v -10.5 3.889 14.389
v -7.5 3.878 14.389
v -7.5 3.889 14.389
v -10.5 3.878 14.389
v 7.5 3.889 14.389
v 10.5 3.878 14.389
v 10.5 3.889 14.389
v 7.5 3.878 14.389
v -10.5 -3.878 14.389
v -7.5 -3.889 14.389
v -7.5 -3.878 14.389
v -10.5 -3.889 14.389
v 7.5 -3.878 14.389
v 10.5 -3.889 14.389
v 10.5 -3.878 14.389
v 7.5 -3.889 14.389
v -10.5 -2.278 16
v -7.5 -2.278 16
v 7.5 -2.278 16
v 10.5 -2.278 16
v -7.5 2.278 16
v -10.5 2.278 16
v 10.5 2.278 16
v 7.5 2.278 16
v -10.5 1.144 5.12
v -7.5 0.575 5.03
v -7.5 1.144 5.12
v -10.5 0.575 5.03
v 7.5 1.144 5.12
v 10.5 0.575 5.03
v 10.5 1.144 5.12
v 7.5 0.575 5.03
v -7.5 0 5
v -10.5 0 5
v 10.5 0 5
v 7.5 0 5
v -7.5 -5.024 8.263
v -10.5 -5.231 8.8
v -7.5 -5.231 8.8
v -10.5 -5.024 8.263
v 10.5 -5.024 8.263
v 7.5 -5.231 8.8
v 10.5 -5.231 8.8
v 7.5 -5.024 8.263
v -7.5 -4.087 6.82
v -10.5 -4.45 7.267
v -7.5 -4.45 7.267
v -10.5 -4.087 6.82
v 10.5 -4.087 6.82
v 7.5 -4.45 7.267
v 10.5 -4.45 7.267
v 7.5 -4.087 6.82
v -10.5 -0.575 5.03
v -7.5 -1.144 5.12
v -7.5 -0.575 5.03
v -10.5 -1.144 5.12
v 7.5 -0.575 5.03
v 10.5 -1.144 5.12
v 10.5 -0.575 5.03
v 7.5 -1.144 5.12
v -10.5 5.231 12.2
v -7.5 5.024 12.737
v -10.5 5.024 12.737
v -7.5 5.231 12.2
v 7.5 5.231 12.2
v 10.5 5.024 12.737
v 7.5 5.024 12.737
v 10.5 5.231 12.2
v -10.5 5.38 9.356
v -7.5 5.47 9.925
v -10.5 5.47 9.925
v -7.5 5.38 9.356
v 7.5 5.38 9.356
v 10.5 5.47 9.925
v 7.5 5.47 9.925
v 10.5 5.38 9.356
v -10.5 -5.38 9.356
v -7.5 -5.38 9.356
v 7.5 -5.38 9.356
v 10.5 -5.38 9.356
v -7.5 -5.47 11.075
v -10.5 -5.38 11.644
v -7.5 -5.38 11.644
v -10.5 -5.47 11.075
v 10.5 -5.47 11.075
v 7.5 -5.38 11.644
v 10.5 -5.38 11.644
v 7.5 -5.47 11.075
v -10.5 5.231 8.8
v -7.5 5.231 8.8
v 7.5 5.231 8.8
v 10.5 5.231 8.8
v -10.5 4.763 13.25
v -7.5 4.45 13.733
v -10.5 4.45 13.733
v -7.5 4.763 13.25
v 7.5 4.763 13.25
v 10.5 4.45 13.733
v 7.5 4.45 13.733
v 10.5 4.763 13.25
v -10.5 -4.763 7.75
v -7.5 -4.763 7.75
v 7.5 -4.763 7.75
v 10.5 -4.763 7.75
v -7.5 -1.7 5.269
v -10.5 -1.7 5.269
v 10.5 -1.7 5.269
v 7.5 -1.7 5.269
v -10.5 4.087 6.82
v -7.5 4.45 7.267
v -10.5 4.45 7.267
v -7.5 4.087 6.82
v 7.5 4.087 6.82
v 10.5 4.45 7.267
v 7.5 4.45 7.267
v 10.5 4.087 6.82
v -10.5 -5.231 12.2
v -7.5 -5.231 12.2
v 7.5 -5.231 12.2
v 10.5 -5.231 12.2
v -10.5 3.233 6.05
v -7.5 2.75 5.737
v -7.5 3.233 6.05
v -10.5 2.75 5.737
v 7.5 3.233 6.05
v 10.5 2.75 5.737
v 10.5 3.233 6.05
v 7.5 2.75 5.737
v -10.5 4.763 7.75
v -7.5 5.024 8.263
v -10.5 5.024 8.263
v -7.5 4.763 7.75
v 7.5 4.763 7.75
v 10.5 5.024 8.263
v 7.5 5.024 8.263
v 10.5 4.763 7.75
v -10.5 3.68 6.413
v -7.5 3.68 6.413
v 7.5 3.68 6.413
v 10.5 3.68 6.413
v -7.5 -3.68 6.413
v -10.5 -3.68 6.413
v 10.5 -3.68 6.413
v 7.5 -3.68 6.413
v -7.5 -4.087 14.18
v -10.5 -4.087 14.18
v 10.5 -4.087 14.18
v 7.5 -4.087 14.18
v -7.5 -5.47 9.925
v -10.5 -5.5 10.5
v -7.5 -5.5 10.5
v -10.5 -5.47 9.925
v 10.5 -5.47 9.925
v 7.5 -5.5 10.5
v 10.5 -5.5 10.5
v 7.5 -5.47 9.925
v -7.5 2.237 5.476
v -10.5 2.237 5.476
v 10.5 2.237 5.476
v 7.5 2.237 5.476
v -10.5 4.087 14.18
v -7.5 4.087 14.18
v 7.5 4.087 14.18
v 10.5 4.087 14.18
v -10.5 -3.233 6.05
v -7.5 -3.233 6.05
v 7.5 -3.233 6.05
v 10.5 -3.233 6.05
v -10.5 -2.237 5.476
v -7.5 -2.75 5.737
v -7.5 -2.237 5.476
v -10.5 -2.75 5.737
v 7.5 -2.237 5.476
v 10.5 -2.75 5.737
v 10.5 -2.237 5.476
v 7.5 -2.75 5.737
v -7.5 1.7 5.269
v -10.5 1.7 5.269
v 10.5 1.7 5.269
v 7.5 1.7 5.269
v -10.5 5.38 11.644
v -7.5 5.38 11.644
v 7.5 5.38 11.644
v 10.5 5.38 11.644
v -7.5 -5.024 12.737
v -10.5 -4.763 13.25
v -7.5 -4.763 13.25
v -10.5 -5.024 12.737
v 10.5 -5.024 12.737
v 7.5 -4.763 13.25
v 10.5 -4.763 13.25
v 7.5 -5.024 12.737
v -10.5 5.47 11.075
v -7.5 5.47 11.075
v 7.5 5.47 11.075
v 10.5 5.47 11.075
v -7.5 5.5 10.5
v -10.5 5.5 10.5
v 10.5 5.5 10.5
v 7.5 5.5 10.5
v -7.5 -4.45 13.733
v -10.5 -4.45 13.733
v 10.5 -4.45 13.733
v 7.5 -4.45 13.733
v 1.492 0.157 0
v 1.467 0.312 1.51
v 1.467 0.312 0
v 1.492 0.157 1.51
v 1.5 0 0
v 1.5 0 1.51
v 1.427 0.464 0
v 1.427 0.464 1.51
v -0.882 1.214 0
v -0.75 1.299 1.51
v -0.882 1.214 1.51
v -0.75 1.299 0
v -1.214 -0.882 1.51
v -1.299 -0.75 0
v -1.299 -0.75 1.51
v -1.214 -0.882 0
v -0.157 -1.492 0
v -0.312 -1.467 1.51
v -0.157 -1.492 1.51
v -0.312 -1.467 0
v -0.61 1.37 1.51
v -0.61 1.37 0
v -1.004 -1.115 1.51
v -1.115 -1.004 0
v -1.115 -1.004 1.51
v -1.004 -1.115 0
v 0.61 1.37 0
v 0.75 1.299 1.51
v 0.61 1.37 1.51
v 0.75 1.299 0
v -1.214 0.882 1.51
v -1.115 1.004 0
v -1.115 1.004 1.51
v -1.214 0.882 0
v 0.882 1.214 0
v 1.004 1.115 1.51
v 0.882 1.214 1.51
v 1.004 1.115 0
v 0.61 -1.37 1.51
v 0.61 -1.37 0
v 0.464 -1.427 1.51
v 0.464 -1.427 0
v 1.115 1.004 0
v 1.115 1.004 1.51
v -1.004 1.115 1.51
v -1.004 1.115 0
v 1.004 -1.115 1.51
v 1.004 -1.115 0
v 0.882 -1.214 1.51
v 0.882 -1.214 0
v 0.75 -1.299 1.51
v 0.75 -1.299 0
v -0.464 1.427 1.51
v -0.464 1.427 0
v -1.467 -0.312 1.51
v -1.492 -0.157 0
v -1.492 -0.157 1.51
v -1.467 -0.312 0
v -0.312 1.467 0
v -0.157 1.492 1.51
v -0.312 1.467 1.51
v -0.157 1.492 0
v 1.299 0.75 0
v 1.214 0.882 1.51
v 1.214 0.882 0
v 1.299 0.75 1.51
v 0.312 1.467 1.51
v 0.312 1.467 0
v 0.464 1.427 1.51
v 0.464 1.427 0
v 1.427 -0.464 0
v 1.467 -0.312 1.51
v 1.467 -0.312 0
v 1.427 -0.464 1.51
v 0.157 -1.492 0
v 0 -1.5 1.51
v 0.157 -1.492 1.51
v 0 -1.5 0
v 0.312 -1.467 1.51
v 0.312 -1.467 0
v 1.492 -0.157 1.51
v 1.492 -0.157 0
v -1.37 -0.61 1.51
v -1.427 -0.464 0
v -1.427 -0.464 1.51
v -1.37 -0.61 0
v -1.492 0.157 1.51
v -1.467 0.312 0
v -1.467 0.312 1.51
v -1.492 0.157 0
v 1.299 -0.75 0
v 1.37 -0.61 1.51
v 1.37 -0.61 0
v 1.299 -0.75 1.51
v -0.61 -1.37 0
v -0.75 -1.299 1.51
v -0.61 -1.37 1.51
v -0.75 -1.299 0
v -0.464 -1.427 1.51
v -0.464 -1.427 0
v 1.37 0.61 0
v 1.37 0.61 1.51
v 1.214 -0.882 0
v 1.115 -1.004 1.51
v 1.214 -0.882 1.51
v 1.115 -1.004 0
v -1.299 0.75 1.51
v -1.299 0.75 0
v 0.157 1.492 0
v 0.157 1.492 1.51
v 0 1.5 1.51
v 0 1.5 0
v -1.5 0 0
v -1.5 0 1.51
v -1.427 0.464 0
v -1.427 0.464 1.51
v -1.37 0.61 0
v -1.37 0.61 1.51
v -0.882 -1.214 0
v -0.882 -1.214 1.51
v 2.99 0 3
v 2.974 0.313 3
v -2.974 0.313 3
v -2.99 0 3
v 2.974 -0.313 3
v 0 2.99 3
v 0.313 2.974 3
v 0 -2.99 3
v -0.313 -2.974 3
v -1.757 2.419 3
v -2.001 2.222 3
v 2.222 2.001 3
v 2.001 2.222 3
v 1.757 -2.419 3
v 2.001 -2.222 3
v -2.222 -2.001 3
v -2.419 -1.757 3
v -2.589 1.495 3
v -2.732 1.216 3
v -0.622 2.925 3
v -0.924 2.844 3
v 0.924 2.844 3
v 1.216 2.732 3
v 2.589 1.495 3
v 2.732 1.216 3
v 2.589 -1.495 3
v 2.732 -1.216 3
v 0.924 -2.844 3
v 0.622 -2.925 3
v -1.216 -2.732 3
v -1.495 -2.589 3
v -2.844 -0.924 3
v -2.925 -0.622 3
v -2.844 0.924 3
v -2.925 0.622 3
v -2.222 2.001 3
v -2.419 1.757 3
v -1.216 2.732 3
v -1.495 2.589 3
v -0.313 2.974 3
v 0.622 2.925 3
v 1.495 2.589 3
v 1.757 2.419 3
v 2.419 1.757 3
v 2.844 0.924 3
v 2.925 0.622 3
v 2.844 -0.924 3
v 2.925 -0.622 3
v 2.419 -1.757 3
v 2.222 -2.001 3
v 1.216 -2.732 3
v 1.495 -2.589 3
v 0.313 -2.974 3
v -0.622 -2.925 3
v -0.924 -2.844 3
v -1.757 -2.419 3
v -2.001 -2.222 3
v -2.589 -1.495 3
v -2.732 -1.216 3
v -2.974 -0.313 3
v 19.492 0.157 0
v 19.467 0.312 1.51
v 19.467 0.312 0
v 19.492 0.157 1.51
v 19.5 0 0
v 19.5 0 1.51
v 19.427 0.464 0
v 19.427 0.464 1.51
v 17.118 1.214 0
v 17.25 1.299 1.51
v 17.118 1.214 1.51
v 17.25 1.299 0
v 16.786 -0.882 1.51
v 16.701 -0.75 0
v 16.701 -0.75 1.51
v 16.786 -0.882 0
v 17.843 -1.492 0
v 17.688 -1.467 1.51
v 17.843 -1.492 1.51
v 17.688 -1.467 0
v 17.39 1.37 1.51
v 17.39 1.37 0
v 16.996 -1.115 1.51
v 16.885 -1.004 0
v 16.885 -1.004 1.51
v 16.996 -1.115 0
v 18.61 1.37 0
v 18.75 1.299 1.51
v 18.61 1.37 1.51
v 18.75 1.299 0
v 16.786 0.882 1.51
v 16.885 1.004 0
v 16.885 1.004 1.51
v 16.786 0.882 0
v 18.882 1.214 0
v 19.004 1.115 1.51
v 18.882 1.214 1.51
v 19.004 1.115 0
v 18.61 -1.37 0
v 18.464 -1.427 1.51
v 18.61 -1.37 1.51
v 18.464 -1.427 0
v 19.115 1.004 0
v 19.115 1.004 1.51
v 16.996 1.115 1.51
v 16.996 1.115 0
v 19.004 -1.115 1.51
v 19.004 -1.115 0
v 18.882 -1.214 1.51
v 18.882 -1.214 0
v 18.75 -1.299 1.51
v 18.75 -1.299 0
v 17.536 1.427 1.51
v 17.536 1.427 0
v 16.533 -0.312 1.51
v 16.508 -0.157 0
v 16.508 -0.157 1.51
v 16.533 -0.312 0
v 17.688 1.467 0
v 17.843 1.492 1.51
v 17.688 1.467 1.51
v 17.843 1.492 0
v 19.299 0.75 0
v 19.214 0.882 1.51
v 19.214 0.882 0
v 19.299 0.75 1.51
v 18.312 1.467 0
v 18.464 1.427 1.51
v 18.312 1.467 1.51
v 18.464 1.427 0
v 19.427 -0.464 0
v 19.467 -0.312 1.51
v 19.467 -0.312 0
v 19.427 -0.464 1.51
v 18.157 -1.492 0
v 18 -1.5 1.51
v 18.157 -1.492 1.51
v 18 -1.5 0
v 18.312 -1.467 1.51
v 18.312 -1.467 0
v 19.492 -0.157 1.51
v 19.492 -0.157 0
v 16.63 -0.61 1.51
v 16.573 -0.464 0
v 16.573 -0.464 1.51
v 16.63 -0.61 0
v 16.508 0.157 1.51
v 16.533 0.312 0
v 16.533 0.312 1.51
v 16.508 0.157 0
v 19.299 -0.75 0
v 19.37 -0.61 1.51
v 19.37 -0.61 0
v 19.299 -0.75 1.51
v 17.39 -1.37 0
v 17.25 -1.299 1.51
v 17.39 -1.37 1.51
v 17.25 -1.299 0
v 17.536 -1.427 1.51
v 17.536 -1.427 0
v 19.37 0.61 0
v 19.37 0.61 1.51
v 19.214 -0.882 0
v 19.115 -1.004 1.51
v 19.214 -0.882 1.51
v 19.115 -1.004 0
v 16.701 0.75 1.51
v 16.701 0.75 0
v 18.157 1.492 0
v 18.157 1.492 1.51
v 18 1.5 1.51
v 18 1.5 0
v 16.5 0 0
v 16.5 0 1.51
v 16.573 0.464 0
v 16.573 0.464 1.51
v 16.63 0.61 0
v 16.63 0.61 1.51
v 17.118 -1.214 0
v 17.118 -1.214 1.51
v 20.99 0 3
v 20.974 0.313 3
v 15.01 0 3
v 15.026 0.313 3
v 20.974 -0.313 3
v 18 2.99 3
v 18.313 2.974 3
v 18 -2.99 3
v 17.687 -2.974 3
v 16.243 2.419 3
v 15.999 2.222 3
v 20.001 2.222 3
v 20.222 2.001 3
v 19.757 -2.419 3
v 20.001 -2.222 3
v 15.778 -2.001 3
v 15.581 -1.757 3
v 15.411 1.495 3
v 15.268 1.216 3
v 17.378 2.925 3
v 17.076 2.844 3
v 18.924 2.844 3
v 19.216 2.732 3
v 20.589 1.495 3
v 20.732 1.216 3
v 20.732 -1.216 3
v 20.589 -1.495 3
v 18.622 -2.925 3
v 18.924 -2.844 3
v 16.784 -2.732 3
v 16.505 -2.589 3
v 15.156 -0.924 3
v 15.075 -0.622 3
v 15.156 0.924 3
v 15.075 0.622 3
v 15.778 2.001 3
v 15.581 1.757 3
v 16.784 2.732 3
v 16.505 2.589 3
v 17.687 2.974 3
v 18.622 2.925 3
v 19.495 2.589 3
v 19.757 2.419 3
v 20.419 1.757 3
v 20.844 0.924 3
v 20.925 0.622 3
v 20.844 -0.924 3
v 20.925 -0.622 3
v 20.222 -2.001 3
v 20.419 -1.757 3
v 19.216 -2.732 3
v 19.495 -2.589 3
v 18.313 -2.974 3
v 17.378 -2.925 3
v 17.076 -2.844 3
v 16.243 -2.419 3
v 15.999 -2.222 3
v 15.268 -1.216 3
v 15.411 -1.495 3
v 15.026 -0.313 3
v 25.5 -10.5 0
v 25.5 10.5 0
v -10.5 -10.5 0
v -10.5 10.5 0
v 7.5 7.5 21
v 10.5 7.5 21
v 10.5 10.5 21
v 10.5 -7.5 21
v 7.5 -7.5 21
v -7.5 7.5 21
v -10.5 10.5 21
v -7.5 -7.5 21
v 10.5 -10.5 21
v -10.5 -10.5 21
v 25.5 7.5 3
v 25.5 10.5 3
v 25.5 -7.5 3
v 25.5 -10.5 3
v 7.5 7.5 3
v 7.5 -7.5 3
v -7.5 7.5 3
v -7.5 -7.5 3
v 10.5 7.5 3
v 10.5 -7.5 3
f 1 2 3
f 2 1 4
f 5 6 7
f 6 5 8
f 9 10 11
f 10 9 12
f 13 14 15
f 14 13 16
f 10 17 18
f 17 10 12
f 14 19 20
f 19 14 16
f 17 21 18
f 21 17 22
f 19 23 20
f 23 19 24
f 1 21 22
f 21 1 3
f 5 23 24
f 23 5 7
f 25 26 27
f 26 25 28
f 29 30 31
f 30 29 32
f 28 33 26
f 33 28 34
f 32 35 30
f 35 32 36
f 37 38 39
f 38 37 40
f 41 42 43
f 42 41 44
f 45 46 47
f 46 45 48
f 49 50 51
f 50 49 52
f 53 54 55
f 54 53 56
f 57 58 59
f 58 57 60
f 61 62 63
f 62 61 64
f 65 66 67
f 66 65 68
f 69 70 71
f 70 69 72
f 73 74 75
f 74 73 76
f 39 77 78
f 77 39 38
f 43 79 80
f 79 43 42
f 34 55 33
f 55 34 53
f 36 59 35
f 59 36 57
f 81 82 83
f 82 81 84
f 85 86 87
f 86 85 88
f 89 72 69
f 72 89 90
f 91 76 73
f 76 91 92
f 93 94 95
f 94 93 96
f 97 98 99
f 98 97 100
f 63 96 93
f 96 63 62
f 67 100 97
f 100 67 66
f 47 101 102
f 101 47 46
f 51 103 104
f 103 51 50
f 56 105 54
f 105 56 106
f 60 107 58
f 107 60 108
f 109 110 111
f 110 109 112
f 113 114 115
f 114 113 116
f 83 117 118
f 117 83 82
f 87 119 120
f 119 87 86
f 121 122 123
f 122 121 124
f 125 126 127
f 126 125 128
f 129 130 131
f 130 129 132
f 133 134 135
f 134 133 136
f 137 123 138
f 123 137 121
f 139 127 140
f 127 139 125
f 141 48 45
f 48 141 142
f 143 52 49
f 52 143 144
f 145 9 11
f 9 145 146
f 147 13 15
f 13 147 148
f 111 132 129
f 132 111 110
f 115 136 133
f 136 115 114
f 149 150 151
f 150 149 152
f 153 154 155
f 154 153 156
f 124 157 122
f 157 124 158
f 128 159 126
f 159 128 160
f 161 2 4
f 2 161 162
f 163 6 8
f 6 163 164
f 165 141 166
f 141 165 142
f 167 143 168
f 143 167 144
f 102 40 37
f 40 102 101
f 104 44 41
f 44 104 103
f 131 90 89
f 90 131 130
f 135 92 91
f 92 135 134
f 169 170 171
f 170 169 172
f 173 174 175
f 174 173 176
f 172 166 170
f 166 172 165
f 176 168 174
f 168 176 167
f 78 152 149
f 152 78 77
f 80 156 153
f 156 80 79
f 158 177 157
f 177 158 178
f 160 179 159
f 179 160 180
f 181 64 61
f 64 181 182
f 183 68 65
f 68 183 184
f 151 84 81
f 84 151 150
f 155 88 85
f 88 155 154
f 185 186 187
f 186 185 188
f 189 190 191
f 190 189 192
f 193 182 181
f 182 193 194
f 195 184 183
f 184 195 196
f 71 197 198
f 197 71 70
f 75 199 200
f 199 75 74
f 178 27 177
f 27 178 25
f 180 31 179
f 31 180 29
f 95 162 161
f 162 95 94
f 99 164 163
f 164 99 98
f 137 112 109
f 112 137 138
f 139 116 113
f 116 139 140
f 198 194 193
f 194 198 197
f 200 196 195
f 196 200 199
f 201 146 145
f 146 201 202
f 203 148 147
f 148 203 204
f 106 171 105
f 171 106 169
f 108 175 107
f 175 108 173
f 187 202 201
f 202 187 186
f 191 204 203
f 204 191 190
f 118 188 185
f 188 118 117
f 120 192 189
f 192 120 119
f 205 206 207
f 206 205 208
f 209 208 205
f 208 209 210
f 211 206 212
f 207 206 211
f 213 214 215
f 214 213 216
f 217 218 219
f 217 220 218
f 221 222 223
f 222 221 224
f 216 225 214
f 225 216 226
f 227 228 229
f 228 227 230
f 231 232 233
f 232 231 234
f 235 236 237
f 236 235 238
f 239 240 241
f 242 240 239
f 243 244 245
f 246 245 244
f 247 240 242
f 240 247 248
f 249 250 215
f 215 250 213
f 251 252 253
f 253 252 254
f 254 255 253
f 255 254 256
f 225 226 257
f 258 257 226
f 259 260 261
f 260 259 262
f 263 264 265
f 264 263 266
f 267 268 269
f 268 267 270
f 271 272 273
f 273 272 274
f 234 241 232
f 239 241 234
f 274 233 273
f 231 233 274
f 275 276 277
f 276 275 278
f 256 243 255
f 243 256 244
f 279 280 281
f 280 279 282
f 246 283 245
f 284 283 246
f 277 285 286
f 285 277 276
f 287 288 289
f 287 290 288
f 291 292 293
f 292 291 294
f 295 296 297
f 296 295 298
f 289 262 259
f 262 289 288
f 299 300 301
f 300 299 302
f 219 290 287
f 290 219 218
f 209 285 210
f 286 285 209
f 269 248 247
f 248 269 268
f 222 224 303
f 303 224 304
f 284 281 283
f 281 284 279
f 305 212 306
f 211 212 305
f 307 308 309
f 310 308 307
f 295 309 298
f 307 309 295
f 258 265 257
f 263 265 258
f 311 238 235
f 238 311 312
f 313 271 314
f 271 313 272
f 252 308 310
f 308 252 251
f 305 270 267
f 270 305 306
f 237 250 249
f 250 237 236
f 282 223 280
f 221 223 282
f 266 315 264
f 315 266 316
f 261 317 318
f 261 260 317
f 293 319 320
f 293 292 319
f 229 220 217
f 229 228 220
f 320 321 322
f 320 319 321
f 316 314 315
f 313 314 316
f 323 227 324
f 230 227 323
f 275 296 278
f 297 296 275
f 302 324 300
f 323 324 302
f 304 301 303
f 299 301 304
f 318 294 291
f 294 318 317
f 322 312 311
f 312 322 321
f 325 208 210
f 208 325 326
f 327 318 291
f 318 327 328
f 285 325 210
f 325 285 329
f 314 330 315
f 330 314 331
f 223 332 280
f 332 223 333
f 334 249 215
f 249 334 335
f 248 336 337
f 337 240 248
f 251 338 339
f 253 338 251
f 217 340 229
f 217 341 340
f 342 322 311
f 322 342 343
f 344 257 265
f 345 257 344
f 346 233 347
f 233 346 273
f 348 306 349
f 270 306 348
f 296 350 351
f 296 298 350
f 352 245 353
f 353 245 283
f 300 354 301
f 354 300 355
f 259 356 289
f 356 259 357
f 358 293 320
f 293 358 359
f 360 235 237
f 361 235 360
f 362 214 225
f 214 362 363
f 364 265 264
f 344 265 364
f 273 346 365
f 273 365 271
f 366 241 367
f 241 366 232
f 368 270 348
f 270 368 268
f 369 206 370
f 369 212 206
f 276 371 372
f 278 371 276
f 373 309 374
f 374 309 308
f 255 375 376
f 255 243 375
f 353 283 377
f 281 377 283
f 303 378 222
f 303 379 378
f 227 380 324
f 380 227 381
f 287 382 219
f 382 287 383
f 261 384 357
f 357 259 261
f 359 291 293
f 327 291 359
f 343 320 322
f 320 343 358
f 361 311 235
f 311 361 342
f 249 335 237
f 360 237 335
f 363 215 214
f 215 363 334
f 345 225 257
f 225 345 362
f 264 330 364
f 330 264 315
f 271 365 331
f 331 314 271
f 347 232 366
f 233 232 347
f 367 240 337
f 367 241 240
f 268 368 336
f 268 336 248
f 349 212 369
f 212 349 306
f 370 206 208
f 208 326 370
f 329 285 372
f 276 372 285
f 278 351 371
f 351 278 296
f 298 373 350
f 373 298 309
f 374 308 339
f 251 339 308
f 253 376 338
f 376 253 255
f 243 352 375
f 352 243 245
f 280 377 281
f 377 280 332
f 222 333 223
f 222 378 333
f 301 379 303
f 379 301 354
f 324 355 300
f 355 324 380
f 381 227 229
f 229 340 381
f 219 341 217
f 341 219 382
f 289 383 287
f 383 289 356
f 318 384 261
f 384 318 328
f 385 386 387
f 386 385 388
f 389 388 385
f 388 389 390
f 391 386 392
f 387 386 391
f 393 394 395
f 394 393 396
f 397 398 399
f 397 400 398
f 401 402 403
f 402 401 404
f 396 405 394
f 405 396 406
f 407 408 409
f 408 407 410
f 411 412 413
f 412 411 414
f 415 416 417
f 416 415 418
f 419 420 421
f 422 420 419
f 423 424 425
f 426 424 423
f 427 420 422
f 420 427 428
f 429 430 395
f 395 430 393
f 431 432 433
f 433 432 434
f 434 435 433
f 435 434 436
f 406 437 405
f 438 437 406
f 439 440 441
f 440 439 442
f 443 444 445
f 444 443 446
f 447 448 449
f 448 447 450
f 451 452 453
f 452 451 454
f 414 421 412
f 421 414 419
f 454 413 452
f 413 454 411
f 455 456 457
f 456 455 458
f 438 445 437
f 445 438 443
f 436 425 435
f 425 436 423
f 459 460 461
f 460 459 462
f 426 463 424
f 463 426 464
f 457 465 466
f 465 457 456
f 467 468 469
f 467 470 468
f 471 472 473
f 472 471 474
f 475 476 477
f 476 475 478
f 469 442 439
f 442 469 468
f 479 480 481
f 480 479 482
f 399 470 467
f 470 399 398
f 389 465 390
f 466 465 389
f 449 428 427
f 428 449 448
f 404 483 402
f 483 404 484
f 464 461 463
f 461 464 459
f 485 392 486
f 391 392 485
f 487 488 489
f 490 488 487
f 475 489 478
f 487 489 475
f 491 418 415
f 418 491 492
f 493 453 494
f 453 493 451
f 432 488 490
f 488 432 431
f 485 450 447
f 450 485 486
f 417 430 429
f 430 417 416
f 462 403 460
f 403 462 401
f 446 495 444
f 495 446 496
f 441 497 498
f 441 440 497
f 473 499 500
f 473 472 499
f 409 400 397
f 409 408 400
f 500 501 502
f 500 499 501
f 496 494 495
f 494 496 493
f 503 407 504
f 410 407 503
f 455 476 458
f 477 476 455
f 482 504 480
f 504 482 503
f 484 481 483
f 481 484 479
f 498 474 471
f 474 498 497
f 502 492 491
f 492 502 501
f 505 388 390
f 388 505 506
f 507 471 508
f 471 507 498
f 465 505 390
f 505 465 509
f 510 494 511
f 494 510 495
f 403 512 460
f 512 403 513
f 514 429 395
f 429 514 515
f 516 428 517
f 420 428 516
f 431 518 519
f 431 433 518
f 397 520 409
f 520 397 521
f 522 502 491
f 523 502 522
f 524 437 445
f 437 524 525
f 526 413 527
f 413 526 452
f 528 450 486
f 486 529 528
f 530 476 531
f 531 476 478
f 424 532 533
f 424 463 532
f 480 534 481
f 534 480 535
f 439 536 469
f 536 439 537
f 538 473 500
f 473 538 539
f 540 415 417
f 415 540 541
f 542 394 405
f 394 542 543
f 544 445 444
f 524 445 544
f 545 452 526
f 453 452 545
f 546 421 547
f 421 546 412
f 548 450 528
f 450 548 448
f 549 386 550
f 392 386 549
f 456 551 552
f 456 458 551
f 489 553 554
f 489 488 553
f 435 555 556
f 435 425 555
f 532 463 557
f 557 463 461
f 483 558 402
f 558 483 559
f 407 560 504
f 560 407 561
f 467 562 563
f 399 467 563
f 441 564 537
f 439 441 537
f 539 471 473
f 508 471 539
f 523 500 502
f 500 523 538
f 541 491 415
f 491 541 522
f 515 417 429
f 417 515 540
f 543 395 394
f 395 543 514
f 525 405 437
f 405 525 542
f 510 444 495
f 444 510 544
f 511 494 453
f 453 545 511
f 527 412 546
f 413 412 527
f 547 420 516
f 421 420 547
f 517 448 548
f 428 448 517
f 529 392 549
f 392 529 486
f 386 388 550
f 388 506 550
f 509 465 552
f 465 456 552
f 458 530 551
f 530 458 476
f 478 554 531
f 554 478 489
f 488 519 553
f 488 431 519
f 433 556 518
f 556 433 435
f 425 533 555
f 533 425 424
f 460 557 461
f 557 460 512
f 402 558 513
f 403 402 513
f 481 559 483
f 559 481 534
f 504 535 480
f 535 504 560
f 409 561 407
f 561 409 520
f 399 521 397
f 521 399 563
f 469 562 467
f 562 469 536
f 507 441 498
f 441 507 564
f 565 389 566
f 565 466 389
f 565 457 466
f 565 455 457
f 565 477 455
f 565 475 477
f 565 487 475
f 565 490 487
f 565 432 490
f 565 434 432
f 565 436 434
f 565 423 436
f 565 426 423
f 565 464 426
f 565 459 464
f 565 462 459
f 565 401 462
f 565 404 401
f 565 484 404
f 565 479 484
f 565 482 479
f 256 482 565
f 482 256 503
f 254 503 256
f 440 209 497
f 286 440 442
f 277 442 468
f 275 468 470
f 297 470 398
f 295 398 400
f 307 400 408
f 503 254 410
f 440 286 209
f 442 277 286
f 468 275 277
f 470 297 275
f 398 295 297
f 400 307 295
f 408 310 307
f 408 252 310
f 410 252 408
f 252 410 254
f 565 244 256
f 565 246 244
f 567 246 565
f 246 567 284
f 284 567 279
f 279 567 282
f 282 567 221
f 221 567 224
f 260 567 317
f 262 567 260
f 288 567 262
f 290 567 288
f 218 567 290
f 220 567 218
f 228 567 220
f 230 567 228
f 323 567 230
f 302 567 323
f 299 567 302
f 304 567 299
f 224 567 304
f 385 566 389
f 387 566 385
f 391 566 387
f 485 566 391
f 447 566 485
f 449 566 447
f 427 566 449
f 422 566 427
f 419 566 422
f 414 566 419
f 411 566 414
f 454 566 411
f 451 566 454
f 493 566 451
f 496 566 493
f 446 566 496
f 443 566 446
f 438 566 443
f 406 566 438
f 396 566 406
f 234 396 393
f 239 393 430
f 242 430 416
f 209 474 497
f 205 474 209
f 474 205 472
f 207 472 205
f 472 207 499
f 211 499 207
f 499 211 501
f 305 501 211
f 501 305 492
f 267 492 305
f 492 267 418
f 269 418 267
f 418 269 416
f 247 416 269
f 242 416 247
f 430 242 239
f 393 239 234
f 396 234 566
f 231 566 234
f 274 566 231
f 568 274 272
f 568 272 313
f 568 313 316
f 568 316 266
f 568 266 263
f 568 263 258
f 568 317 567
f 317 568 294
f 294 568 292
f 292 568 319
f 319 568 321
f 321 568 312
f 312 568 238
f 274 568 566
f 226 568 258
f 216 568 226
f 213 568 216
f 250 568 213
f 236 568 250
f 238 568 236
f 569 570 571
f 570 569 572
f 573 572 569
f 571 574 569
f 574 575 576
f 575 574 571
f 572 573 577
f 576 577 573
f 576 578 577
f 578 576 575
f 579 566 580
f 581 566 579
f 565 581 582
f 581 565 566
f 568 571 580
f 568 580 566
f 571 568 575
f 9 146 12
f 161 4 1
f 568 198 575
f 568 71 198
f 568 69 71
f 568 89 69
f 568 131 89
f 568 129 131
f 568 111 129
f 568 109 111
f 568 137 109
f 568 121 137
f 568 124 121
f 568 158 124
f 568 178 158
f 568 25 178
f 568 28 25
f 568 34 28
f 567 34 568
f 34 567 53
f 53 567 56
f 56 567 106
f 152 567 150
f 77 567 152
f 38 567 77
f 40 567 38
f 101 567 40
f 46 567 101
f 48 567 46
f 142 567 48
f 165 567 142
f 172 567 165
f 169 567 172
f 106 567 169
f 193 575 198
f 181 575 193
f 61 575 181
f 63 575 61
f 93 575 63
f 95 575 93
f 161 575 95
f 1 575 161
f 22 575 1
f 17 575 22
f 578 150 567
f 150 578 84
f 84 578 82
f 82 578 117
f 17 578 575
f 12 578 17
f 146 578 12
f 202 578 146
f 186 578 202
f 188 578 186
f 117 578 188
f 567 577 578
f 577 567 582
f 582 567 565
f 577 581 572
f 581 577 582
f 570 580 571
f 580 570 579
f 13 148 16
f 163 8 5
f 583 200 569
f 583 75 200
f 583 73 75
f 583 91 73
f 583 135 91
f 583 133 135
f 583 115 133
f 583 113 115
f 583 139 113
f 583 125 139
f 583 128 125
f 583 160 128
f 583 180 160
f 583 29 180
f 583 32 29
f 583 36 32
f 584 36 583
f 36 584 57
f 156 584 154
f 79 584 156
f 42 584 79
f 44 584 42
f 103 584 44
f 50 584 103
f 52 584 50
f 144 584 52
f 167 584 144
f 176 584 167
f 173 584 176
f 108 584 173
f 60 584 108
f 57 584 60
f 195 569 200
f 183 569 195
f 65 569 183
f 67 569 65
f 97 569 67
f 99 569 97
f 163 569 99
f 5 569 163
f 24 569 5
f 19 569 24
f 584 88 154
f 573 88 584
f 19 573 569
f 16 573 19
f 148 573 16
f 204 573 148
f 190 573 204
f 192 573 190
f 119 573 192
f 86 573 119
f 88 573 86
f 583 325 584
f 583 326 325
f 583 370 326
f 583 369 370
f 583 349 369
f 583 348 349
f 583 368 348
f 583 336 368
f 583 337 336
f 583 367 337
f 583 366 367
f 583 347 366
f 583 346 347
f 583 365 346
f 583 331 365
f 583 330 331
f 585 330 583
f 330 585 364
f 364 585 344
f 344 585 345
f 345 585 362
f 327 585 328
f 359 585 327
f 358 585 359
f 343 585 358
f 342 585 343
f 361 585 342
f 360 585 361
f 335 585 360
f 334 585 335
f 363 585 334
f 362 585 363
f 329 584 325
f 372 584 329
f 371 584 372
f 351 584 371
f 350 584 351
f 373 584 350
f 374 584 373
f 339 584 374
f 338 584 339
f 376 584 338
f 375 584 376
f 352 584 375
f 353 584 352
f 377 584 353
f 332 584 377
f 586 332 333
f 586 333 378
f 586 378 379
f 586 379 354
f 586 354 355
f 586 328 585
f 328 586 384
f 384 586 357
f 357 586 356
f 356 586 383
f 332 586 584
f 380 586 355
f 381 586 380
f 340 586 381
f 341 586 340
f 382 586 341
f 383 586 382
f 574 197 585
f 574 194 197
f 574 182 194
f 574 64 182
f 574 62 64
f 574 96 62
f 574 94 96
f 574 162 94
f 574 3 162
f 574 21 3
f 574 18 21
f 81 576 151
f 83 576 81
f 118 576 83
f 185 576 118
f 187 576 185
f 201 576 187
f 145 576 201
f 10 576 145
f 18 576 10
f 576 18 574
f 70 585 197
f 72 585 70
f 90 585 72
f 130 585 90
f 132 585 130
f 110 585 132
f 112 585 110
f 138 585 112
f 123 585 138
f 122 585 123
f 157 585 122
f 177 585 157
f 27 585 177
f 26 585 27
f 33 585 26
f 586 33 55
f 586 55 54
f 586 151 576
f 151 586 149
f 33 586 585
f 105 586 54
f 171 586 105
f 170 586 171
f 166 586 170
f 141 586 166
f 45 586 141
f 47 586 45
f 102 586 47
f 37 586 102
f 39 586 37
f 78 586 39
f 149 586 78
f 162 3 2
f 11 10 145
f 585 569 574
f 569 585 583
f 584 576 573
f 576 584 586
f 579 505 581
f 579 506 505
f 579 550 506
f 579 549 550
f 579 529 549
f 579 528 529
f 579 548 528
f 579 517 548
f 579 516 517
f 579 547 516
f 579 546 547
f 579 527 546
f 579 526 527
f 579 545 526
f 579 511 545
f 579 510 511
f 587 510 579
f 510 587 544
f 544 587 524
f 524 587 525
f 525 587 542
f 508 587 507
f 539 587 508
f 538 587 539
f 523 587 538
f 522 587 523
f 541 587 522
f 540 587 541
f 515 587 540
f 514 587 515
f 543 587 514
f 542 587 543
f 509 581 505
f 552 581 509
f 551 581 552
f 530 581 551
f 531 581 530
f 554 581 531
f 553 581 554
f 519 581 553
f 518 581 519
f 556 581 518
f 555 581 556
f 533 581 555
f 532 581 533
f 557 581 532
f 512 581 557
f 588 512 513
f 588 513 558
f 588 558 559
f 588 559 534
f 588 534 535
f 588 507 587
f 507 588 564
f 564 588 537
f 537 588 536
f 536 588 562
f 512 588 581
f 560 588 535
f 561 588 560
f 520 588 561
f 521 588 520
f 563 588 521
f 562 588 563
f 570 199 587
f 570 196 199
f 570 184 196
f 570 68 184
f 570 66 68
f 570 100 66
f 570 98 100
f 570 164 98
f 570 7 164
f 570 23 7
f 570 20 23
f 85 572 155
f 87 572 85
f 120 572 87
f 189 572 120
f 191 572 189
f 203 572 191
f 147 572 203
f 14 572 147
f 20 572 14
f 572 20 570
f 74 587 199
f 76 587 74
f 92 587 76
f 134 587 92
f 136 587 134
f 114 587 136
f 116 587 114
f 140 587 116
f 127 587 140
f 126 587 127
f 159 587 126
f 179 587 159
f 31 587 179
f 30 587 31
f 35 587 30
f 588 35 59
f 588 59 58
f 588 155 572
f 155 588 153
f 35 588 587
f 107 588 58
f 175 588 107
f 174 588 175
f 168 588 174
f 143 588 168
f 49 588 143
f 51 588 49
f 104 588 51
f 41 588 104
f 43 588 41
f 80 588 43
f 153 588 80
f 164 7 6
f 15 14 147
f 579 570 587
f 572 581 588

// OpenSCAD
THICKNESS = 3;
SIZE = 15;
SCREW1_R = 3/2;
SCREW1_TOP_R = 6/2;
SCREW2_R = 10/2;
TOL = 0.5;
EPS = 0.01;

$fn = 60;

module cylhole (h, r) render(convexity=1) {
    N = 8;
    cylinder (500, r=r);
    intersection () {
        translate ([-r-r/sqrt(2), -r, 0]) cube ([r, r*2, h]);
        rotate ([0, 0, 180/N]) cylinder (500, r=r/cos(180/N), $fn=N);
    }
}

difference () {
    translate ([-SIZE/2-THICKNESS, -SIZE/2-THICKNESS, 0]) hull () {
        cube ([SIZE+THICKNESS*2, SIZE+THICKNESS*2, SIZE+THICKNESS*2]);
        cube ([SIZE*2+THICKNESS*2, SIZE+THICKNESS*2, THICKNESS]);
    }
    translate ([-SIZE/2, -SIZE/2, THICKNESS]) {
        cube ([SIZE, SIZE, SIZE+THICKNESS*2]);
    }
    translate ([SIZE/2+THICKNESS, -SIZE/2, THICKNESS]) {
        cube ([SIZE, SIZE, SIZE+THICKNESS]);
    }
    rotate ([0, 90, 0]) translate ([-SIZE/2-THICKNESS, 0, -SIZE]) {
        cylhole (SIZE*2, r=SCREW2_R+TOL);
    }
    for (x=[0,1]) translate ([x*(SIZE+THICKNESS), 0, -EPS]) {
        cylinder (SIZE, r=SCREW1_R);
        translate ([0, 0, THICKNESS-SCREW1_TOP_R+EPS*2]) {
            cylinder (SCREW1_TOP_R, r1=0, r2=SCREW1_TOP_R);
        }
    }
}
